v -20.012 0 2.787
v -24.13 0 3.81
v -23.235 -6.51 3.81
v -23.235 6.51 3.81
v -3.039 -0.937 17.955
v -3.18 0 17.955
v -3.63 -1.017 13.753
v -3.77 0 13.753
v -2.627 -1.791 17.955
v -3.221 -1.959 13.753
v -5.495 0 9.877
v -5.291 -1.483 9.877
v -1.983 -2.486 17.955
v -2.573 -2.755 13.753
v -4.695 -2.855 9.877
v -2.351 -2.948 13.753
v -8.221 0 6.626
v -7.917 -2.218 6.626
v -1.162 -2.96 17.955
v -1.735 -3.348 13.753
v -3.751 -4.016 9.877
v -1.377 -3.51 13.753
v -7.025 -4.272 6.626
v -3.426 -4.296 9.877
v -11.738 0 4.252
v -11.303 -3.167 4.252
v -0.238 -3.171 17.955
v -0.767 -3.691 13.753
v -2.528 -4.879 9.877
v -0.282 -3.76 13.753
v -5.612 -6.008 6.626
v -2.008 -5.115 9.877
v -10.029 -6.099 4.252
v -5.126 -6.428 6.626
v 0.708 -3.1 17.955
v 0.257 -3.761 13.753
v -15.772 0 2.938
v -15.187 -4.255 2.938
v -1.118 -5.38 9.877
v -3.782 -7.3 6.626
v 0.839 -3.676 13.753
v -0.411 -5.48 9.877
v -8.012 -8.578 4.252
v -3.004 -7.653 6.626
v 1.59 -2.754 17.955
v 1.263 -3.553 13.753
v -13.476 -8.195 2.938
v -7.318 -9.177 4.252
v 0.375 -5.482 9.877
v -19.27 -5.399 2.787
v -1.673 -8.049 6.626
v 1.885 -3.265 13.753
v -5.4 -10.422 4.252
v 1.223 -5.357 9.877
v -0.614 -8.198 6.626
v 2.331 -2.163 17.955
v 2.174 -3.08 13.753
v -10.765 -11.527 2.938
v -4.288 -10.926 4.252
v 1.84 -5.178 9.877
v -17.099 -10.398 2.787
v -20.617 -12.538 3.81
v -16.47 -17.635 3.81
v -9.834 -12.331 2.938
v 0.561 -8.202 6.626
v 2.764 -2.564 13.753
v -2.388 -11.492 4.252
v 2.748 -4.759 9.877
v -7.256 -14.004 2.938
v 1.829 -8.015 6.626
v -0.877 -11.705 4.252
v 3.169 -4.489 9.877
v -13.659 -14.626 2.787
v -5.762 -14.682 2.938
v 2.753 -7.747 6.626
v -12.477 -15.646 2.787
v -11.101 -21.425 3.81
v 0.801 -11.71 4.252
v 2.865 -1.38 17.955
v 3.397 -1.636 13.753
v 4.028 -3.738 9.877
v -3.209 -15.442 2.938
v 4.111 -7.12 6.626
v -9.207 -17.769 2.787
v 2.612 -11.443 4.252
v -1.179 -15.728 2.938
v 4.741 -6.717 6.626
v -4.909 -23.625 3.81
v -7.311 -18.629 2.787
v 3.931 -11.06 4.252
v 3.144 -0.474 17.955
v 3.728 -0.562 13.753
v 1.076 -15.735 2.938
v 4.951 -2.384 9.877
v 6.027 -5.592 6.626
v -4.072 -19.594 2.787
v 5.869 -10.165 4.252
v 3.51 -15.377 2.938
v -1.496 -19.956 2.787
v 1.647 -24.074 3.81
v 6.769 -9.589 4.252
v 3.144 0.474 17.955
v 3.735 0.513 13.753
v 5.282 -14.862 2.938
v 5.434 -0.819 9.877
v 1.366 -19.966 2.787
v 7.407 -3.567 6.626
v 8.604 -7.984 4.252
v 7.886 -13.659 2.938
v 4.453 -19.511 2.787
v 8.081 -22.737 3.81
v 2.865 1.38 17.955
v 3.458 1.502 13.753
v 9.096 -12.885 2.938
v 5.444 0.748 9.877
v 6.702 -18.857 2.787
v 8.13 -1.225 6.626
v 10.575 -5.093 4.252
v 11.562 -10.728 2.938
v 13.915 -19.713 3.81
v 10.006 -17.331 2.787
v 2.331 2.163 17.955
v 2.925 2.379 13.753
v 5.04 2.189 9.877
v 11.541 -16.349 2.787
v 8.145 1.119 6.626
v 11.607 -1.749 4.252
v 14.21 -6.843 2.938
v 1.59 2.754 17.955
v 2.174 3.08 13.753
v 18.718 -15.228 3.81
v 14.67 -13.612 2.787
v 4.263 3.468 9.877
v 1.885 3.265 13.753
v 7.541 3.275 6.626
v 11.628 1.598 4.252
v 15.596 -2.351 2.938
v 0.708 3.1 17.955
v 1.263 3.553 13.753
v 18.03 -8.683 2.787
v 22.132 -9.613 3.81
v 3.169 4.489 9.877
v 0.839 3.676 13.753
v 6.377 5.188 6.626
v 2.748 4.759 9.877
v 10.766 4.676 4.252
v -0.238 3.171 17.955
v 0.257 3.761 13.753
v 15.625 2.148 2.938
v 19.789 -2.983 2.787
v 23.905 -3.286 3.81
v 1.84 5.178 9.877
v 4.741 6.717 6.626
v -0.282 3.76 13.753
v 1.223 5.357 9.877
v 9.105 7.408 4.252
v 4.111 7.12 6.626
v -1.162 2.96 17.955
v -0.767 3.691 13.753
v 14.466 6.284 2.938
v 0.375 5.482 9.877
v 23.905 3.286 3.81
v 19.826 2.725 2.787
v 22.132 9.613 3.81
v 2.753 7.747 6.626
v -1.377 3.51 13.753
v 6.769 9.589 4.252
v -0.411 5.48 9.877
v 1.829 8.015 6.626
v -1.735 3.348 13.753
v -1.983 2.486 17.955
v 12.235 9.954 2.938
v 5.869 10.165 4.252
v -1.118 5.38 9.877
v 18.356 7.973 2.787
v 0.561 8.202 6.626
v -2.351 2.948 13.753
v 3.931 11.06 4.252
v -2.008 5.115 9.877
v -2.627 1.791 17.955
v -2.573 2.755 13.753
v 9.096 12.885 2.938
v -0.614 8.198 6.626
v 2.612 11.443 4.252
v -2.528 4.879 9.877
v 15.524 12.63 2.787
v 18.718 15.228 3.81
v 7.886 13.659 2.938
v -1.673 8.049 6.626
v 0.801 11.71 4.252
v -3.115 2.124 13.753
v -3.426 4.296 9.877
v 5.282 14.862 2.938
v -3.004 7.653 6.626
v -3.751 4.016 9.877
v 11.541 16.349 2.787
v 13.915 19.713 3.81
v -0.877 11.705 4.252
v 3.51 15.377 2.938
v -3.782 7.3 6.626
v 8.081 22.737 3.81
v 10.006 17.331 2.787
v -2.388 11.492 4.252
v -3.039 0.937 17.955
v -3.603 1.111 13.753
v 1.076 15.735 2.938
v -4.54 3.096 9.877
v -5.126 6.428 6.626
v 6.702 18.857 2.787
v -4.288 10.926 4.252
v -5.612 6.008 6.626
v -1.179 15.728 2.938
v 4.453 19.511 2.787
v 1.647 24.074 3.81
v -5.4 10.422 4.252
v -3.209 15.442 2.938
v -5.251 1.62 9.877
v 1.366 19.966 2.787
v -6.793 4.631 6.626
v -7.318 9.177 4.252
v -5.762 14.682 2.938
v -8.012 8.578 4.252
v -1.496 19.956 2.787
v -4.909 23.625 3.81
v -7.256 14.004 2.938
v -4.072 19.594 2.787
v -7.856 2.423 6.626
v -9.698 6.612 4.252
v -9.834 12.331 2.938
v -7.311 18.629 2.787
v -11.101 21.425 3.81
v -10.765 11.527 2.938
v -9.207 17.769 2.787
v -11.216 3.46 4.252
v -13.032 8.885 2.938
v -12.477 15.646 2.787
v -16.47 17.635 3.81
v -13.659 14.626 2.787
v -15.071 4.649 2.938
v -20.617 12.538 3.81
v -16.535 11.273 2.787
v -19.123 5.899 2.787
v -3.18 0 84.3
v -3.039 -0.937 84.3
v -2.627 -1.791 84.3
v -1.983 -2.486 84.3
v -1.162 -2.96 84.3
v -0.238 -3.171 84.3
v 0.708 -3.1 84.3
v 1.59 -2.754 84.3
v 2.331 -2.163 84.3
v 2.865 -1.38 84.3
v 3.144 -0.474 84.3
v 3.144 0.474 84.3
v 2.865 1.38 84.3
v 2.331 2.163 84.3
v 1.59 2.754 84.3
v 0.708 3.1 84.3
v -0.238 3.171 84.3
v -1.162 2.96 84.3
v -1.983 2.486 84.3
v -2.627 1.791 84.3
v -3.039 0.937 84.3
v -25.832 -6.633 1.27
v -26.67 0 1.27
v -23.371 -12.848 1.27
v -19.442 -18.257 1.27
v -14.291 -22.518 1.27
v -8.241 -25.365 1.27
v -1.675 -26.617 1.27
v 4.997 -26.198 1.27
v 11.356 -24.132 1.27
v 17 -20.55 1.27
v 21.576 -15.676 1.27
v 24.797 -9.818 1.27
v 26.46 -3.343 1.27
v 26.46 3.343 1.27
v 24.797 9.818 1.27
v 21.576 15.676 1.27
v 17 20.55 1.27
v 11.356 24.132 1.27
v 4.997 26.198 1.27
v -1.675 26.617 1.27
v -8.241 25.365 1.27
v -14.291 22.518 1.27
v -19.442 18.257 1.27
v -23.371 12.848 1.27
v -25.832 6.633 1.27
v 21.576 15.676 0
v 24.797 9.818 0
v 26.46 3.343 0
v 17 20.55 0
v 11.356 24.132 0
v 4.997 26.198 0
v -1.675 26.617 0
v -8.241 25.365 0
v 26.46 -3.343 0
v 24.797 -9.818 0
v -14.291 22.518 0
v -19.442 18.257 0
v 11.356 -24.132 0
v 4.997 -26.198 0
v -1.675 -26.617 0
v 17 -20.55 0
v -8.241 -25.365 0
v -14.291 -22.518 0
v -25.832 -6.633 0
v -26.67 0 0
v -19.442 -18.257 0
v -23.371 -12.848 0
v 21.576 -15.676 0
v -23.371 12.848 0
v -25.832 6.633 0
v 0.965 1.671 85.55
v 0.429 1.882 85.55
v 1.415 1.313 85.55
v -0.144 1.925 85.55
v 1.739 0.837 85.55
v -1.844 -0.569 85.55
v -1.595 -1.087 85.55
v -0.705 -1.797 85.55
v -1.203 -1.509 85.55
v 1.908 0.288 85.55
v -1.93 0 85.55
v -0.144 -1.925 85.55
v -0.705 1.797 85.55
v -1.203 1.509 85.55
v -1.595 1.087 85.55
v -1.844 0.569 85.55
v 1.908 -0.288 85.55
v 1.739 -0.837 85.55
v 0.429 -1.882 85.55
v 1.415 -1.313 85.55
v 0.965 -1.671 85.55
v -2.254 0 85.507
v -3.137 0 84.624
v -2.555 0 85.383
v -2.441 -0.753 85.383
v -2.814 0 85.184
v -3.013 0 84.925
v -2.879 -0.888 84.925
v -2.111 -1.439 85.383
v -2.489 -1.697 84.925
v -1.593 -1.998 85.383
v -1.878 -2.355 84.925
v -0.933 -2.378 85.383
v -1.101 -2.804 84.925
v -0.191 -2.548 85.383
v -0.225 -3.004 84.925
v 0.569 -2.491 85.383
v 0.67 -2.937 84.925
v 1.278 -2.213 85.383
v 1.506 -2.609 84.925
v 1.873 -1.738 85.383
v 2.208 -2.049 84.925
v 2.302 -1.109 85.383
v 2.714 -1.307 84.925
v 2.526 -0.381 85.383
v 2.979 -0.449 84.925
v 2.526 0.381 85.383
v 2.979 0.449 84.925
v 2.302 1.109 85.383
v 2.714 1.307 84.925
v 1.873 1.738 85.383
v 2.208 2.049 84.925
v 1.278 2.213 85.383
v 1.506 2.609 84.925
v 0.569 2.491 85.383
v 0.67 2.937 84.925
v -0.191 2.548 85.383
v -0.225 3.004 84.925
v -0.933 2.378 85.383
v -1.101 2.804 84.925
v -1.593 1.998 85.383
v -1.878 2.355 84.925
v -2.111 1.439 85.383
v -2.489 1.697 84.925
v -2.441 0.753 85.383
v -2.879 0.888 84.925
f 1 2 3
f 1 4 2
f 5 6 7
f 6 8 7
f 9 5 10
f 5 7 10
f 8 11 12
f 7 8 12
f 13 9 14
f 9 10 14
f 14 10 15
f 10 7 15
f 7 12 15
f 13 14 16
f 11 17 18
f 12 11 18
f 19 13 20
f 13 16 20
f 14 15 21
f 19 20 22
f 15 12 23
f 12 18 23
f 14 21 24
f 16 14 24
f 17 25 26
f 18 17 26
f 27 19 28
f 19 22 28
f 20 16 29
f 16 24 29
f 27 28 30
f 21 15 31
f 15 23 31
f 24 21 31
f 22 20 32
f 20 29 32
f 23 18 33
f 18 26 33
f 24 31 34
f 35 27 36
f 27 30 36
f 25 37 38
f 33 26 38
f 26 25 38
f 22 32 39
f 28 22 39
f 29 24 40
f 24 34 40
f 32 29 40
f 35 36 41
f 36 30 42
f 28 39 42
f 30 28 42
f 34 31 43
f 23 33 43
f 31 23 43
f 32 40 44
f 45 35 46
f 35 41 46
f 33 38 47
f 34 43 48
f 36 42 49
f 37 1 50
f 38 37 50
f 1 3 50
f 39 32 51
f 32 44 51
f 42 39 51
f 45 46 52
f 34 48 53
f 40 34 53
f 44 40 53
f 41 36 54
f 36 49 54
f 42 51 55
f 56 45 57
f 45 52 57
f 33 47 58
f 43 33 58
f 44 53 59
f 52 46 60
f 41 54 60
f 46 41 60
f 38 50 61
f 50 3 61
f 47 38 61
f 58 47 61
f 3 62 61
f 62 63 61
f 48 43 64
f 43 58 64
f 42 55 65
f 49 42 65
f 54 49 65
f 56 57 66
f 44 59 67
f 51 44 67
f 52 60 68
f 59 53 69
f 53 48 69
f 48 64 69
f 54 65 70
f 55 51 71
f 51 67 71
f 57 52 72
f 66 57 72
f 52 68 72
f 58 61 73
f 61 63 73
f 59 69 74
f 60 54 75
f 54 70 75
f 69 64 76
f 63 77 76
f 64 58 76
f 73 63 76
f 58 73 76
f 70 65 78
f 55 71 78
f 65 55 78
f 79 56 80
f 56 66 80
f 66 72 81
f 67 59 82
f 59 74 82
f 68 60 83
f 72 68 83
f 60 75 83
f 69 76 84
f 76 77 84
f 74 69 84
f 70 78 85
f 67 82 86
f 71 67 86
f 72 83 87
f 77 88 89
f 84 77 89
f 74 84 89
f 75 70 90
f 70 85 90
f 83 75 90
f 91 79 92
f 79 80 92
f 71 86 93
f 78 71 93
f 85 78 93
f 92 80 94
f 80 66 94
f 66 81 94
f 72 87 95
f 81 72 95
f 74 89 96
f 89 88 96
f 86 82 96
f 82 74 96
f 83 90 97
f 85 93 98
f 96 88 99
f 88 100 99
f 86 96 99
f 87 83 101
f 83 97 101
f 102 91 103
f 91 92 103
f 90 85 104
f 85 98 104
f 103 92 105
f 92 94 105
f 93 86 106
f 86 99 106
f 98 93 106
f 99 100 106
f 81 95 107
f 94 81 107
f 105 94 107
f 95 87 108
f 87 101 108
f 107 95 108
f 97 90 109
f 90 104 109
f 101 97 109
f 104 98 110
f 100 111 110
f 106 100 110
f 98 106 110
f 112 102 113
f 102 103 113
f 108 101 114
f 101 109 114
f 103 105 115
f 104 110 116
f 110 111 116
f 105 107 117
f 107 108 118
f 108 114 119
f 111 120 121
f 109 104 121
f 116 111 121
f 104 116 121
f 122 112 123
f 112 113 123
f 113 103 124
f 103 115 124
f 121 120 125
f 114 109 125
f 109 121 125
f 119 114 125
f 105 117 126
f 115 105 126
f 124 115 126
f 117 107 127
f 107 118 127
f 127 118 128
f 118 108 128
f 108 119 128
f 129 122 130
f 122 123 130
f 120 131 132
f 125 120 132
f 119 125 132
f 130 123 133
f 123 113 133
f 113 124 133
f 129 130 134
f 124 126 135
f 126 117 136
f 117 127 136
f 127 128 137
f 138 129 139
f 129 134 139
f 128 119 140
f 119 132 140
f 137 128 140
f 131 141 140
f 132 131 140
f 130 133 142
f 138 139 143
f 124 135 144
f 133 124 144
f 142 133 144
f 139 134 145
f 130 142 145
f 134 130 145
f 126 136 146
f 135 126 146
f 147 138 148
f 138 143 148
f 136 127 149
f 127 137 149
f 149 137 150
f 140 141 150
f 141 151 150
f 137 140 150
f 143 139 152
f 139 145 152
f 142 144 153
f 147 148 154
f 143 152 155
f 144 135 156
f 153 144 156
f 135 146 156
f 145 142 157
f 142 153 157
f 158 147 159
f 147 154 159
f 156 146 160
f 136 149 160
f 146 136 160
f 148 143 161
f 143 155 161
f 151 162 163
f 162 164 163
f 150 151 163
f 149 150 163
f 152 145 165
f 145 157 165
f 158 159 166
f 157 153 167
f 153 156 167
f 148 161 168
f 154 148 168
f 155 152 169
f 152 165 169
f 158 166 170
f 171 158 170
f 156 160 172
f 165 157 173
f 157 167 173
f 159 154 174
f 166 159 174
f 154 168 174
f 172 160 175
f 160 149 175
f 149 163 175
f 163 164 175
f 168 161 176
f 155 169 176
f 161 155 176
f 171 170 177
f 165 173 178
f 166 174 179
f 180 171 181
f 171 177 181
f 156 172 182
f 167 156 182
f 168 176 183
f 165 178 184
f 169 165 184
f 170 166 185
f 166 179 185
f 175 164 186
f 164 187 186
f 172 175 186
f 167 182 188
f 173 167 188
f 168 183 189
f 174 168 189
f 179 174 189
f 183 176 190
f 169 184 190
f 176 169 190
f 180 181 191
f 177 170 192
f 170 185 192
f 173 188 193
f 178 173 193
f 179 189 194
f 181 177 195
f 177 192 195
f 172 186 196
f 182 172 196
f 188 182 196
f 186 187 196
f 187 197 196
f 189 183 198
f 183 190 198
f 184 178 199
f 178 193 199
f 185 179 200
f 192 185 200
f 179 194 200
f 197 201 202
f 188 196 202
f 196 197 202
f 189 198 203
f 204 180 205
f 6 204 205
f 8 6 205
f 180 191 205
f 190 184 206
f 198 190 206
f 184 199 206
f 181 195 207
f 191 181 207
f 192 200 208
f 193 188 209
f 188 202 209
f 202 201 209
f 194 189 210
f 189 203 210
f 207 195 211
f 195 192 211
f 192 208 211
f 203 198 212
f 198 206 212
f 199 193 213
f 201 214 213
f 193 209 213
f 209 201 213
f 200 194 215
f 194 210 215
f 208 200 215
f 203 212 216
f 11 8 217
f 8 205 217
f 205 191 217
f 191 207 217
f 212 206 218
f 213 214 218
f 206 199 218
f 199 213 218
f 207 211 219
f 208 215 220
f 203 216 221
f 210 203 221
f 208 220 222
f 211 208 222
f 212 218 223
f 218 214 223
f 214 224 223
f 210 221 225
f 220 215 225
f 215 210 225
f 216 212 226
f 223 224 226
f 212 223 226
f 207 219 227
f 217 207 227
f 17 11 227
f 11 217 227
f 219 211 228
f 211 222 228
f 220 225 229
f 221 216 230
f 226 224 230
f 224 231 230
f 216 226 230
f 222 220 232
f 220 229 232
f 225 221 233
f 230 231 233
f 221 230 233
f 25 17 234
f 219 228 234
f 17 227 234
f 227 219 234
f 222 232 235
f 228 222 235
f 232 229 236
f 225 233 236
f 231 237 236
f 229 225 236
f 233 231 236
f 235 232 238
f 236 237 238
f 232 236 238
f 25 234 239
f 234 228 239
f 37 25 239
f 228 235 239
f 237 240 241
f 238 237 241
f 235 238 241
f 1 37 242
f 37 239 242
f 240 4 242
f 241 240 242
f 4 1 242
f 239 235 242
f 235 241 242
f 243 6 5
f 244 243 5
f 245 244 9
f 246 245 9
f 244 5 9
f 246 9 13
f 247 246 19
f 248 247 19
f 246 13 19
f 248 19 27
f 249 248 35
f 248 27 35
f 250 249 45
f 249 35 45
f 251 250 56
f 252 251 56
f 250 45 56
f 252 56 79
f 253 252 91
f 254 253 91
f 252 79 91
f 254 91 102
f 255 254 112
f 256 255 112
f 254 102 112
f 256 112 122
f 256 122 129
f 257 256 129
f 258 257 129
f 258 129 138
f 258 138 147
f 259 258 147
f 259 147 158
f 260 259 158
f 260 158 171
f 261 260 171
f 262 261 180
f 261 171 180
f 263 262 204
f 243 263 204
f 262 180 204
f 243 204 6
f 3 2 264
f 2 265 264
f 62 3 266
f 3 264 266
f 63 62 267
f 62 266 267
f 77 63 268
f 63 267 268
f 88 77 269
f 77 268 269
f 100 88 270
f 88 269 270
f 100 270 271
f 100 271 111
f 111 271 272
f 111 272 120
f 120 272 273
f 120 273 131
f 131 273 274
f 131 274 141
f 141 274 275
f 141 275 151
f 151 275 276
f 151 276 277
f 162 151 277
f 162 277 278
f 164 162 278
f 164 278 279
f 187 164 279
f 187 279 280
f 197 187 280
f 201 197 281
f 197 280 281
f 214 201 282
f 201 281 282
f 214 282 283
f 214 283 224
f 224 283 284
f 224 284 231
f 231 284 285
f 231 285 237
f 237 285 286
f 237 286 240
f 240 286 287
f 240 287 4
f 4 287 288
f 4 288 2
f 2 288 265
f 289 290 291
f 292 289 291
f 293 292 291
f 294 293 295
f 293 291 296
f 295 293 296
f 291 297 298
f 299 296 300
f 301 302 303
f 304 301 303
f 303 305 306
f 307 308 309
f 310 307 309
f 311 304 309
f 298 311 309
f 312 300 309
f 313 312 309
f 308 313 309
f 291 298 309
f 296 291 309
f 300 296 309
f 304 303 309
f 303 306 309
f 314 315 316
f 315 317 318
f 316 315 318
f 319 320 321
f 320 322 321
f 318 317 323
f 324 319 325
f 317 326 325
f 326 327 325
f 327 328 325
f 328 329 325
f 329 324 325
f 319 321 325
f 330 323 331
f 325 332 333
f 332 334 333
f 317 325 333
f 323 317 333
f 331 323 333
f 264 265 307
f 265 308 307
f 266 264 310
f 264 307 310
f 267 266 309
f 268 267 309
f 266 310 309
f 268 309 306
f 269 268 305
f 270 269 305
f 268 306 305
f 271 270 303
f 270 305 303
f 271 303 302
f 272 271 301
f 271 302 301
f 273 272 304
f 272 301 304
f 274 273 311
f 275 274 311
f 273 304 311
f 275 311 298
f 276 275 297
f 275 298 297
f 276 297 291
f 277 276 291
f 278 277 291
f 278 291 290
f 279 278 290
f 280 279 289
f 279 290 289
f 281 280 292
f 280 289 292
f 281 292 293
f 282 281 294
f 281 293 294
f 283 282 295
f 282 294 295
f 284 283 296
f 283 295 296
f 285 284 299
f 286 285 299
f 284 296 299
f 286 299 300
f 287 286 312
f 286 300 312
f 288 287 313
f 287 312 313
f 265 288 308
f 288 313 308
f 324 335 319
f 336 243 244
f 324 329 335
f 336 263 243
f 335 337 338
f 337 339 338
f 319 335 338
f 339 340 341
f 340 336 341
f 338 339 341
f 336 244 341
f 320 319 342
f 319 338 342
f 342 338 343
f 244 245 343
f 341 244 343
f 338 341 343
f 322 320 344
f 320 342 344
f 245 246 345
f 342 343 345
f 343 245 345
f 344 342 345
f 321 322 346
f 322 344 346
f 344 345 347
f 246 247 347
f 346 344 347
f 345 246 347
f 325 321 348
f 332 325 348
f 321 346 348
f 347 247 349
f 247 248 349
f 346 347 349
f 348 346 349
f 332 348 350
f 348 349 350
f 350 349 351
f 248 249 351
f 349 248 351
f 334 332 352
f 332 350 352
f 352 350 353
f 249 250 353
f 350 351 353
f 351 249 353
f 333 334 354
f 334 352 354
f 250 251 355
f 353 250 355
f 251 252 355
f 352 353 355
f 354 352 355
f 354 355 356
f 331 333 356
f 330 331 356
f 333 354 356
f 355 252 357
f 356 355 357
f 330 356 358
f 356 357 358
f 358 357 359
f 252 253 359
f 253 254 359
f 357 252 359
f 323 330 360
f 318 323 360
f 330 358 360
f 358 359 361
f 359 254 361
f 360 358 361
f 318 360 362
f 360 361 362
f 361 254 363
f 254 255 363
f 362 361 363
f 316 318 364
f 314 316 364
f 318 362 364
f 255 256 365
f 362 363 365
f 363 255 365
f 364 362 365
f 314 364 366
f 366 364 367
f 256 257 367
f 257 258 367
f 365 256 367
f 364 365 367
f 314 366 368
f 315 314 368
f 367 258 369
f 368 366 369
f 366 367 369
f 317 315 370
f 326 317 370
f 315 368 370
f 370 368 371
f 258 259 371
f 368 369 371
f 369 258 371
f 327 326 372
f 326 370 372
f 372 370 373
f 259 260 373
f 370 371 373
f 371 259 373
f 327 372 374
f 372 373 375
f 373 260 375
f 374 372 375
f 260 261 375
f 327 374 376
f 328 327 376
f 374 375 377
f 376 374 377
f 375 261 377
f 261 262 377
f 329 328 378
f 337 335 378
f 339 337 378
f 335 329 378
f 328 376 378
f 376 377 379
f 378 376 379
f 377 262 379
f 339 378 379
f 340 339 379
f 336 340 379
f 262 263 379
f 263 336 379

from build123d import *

# Parameters (mm, degrees)
FILLET1_R = 1.25


with BuildPart() as part:
    # Sketch1 → Revolve1 (revolve)
    with BuildSketch(Plane.YZ, mode=Mode.PRIVATE) as revolve1_sk:
        with BuildLine():
            Line((0, 0), (0, 85.55))
            Line((0, 85.55), (3.18, 85.55))
            Line((3.18, 85.55), (3.18, 17.954698654))
            ThreePointArc((3.18, 17.954698654), (9.896609701, 5.315721242), (24.13, 3.81))
            Line((24.13, 3.81), (26.67, 1.27))
            Line((26.67, 1.27), (26.67, 0))
            Line((26.67, 0), (0, 0))
        make_face()
    revolve(revolve1_sk.sketch.rotate(Axis((0, 0, 0), (0, 0, 1)), 90), axis=Axis((0, 0, 0), (0, 0, 1)))

    # Fillet1
    fillet1_edges = [part.edges().sort_by_distance(p)[0] for p in [
        (3.18, 0, 85.55),
    ]]
    fillet(fillet1_edges, radius=FILLET1_R)


solid = part.part
